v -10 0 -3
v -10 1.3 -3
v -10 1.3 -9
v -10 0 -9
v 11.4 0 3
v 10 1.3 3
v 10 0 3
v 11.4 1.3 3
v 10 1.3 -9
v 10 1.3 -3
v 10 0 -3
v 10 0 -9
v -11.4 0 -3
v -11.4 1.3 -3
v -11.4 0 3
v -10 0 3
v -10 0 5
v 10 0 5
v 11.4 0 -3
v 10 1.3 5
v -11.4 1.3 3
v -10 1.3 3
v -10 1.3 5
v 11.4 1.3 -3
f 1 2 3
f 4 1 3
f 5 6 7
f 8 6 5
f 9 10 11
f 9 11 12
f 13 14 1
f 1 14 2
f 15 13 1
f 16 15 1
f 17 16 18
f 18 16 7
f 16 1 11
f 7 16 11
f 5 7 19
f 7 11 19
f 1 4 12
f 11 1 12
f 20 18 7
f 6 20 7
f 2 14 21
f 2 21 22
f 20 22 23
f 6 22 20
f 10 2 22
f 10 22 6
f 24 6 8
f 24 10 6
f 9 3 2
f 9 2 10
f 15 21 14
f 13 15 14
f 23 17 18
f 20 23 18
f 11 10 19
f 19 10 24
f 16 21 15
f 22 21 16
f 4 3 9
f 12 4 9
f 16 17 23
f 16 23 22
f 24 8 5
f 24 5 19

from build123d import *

# Parameters (mm, degrees)
SKETCH1_W           = 20
SKETCH1_H           = 10
BOSS_EXTRUDE1_DEPTH = 1.3
SKETCH2_W           = 1.4
SKETCH2_H           = 6
BOSS_EXTRUDE2_DEPTH = 1.3
SKETCH3_W           = 20
SKETCH3_H           = 4
BOSS_EXTRUDE3_DEPTH = 1.3


with BuildPart() as part:
    # Sketch1 → Boss-Extrude1 (new body)
    with BuildSketch(Plane(origin=(0, 0, 0), x_dir=(1, 0, 0), z_dir=(0, 1, 0))):
        Rectangle(SKETCH1_W, SKETCH1_H)
    extrude(amount=BOSS_EXTRUDE1_DEPTH)

    # Sketch2 → Boss-Extrude2 (add)
    with BuildSketch(Plane(origin=(0, 1.3, 0), x_dir=(1, 0, 0), z_dir=(0, 1, 0))):
        with Locations((-10.7, 0)):
            Rectangle(SKETCH2_W, SKETCH2_H)
        with Locations((10.7, 0)):
            Rectangle(SKETCH2_W, SKETCH2_H)
    extrude(amount=-BOSS_EXTRUDE2_DEPTH)

    # Sketch3 → Boss-Extrude3 (add)
    with BuildSketch(Plane(origin=(0, 1.3, 0), x_dir=(1, 0, 0), z_dir=(0, 1, 0))):
        with Locations((0, 7)):
            Rectangle(SKETCH3_W, SKETCH3_H)
    extrude(amount=-BOSS_EXTRUDE3_DEPTH)


solid = part.part
